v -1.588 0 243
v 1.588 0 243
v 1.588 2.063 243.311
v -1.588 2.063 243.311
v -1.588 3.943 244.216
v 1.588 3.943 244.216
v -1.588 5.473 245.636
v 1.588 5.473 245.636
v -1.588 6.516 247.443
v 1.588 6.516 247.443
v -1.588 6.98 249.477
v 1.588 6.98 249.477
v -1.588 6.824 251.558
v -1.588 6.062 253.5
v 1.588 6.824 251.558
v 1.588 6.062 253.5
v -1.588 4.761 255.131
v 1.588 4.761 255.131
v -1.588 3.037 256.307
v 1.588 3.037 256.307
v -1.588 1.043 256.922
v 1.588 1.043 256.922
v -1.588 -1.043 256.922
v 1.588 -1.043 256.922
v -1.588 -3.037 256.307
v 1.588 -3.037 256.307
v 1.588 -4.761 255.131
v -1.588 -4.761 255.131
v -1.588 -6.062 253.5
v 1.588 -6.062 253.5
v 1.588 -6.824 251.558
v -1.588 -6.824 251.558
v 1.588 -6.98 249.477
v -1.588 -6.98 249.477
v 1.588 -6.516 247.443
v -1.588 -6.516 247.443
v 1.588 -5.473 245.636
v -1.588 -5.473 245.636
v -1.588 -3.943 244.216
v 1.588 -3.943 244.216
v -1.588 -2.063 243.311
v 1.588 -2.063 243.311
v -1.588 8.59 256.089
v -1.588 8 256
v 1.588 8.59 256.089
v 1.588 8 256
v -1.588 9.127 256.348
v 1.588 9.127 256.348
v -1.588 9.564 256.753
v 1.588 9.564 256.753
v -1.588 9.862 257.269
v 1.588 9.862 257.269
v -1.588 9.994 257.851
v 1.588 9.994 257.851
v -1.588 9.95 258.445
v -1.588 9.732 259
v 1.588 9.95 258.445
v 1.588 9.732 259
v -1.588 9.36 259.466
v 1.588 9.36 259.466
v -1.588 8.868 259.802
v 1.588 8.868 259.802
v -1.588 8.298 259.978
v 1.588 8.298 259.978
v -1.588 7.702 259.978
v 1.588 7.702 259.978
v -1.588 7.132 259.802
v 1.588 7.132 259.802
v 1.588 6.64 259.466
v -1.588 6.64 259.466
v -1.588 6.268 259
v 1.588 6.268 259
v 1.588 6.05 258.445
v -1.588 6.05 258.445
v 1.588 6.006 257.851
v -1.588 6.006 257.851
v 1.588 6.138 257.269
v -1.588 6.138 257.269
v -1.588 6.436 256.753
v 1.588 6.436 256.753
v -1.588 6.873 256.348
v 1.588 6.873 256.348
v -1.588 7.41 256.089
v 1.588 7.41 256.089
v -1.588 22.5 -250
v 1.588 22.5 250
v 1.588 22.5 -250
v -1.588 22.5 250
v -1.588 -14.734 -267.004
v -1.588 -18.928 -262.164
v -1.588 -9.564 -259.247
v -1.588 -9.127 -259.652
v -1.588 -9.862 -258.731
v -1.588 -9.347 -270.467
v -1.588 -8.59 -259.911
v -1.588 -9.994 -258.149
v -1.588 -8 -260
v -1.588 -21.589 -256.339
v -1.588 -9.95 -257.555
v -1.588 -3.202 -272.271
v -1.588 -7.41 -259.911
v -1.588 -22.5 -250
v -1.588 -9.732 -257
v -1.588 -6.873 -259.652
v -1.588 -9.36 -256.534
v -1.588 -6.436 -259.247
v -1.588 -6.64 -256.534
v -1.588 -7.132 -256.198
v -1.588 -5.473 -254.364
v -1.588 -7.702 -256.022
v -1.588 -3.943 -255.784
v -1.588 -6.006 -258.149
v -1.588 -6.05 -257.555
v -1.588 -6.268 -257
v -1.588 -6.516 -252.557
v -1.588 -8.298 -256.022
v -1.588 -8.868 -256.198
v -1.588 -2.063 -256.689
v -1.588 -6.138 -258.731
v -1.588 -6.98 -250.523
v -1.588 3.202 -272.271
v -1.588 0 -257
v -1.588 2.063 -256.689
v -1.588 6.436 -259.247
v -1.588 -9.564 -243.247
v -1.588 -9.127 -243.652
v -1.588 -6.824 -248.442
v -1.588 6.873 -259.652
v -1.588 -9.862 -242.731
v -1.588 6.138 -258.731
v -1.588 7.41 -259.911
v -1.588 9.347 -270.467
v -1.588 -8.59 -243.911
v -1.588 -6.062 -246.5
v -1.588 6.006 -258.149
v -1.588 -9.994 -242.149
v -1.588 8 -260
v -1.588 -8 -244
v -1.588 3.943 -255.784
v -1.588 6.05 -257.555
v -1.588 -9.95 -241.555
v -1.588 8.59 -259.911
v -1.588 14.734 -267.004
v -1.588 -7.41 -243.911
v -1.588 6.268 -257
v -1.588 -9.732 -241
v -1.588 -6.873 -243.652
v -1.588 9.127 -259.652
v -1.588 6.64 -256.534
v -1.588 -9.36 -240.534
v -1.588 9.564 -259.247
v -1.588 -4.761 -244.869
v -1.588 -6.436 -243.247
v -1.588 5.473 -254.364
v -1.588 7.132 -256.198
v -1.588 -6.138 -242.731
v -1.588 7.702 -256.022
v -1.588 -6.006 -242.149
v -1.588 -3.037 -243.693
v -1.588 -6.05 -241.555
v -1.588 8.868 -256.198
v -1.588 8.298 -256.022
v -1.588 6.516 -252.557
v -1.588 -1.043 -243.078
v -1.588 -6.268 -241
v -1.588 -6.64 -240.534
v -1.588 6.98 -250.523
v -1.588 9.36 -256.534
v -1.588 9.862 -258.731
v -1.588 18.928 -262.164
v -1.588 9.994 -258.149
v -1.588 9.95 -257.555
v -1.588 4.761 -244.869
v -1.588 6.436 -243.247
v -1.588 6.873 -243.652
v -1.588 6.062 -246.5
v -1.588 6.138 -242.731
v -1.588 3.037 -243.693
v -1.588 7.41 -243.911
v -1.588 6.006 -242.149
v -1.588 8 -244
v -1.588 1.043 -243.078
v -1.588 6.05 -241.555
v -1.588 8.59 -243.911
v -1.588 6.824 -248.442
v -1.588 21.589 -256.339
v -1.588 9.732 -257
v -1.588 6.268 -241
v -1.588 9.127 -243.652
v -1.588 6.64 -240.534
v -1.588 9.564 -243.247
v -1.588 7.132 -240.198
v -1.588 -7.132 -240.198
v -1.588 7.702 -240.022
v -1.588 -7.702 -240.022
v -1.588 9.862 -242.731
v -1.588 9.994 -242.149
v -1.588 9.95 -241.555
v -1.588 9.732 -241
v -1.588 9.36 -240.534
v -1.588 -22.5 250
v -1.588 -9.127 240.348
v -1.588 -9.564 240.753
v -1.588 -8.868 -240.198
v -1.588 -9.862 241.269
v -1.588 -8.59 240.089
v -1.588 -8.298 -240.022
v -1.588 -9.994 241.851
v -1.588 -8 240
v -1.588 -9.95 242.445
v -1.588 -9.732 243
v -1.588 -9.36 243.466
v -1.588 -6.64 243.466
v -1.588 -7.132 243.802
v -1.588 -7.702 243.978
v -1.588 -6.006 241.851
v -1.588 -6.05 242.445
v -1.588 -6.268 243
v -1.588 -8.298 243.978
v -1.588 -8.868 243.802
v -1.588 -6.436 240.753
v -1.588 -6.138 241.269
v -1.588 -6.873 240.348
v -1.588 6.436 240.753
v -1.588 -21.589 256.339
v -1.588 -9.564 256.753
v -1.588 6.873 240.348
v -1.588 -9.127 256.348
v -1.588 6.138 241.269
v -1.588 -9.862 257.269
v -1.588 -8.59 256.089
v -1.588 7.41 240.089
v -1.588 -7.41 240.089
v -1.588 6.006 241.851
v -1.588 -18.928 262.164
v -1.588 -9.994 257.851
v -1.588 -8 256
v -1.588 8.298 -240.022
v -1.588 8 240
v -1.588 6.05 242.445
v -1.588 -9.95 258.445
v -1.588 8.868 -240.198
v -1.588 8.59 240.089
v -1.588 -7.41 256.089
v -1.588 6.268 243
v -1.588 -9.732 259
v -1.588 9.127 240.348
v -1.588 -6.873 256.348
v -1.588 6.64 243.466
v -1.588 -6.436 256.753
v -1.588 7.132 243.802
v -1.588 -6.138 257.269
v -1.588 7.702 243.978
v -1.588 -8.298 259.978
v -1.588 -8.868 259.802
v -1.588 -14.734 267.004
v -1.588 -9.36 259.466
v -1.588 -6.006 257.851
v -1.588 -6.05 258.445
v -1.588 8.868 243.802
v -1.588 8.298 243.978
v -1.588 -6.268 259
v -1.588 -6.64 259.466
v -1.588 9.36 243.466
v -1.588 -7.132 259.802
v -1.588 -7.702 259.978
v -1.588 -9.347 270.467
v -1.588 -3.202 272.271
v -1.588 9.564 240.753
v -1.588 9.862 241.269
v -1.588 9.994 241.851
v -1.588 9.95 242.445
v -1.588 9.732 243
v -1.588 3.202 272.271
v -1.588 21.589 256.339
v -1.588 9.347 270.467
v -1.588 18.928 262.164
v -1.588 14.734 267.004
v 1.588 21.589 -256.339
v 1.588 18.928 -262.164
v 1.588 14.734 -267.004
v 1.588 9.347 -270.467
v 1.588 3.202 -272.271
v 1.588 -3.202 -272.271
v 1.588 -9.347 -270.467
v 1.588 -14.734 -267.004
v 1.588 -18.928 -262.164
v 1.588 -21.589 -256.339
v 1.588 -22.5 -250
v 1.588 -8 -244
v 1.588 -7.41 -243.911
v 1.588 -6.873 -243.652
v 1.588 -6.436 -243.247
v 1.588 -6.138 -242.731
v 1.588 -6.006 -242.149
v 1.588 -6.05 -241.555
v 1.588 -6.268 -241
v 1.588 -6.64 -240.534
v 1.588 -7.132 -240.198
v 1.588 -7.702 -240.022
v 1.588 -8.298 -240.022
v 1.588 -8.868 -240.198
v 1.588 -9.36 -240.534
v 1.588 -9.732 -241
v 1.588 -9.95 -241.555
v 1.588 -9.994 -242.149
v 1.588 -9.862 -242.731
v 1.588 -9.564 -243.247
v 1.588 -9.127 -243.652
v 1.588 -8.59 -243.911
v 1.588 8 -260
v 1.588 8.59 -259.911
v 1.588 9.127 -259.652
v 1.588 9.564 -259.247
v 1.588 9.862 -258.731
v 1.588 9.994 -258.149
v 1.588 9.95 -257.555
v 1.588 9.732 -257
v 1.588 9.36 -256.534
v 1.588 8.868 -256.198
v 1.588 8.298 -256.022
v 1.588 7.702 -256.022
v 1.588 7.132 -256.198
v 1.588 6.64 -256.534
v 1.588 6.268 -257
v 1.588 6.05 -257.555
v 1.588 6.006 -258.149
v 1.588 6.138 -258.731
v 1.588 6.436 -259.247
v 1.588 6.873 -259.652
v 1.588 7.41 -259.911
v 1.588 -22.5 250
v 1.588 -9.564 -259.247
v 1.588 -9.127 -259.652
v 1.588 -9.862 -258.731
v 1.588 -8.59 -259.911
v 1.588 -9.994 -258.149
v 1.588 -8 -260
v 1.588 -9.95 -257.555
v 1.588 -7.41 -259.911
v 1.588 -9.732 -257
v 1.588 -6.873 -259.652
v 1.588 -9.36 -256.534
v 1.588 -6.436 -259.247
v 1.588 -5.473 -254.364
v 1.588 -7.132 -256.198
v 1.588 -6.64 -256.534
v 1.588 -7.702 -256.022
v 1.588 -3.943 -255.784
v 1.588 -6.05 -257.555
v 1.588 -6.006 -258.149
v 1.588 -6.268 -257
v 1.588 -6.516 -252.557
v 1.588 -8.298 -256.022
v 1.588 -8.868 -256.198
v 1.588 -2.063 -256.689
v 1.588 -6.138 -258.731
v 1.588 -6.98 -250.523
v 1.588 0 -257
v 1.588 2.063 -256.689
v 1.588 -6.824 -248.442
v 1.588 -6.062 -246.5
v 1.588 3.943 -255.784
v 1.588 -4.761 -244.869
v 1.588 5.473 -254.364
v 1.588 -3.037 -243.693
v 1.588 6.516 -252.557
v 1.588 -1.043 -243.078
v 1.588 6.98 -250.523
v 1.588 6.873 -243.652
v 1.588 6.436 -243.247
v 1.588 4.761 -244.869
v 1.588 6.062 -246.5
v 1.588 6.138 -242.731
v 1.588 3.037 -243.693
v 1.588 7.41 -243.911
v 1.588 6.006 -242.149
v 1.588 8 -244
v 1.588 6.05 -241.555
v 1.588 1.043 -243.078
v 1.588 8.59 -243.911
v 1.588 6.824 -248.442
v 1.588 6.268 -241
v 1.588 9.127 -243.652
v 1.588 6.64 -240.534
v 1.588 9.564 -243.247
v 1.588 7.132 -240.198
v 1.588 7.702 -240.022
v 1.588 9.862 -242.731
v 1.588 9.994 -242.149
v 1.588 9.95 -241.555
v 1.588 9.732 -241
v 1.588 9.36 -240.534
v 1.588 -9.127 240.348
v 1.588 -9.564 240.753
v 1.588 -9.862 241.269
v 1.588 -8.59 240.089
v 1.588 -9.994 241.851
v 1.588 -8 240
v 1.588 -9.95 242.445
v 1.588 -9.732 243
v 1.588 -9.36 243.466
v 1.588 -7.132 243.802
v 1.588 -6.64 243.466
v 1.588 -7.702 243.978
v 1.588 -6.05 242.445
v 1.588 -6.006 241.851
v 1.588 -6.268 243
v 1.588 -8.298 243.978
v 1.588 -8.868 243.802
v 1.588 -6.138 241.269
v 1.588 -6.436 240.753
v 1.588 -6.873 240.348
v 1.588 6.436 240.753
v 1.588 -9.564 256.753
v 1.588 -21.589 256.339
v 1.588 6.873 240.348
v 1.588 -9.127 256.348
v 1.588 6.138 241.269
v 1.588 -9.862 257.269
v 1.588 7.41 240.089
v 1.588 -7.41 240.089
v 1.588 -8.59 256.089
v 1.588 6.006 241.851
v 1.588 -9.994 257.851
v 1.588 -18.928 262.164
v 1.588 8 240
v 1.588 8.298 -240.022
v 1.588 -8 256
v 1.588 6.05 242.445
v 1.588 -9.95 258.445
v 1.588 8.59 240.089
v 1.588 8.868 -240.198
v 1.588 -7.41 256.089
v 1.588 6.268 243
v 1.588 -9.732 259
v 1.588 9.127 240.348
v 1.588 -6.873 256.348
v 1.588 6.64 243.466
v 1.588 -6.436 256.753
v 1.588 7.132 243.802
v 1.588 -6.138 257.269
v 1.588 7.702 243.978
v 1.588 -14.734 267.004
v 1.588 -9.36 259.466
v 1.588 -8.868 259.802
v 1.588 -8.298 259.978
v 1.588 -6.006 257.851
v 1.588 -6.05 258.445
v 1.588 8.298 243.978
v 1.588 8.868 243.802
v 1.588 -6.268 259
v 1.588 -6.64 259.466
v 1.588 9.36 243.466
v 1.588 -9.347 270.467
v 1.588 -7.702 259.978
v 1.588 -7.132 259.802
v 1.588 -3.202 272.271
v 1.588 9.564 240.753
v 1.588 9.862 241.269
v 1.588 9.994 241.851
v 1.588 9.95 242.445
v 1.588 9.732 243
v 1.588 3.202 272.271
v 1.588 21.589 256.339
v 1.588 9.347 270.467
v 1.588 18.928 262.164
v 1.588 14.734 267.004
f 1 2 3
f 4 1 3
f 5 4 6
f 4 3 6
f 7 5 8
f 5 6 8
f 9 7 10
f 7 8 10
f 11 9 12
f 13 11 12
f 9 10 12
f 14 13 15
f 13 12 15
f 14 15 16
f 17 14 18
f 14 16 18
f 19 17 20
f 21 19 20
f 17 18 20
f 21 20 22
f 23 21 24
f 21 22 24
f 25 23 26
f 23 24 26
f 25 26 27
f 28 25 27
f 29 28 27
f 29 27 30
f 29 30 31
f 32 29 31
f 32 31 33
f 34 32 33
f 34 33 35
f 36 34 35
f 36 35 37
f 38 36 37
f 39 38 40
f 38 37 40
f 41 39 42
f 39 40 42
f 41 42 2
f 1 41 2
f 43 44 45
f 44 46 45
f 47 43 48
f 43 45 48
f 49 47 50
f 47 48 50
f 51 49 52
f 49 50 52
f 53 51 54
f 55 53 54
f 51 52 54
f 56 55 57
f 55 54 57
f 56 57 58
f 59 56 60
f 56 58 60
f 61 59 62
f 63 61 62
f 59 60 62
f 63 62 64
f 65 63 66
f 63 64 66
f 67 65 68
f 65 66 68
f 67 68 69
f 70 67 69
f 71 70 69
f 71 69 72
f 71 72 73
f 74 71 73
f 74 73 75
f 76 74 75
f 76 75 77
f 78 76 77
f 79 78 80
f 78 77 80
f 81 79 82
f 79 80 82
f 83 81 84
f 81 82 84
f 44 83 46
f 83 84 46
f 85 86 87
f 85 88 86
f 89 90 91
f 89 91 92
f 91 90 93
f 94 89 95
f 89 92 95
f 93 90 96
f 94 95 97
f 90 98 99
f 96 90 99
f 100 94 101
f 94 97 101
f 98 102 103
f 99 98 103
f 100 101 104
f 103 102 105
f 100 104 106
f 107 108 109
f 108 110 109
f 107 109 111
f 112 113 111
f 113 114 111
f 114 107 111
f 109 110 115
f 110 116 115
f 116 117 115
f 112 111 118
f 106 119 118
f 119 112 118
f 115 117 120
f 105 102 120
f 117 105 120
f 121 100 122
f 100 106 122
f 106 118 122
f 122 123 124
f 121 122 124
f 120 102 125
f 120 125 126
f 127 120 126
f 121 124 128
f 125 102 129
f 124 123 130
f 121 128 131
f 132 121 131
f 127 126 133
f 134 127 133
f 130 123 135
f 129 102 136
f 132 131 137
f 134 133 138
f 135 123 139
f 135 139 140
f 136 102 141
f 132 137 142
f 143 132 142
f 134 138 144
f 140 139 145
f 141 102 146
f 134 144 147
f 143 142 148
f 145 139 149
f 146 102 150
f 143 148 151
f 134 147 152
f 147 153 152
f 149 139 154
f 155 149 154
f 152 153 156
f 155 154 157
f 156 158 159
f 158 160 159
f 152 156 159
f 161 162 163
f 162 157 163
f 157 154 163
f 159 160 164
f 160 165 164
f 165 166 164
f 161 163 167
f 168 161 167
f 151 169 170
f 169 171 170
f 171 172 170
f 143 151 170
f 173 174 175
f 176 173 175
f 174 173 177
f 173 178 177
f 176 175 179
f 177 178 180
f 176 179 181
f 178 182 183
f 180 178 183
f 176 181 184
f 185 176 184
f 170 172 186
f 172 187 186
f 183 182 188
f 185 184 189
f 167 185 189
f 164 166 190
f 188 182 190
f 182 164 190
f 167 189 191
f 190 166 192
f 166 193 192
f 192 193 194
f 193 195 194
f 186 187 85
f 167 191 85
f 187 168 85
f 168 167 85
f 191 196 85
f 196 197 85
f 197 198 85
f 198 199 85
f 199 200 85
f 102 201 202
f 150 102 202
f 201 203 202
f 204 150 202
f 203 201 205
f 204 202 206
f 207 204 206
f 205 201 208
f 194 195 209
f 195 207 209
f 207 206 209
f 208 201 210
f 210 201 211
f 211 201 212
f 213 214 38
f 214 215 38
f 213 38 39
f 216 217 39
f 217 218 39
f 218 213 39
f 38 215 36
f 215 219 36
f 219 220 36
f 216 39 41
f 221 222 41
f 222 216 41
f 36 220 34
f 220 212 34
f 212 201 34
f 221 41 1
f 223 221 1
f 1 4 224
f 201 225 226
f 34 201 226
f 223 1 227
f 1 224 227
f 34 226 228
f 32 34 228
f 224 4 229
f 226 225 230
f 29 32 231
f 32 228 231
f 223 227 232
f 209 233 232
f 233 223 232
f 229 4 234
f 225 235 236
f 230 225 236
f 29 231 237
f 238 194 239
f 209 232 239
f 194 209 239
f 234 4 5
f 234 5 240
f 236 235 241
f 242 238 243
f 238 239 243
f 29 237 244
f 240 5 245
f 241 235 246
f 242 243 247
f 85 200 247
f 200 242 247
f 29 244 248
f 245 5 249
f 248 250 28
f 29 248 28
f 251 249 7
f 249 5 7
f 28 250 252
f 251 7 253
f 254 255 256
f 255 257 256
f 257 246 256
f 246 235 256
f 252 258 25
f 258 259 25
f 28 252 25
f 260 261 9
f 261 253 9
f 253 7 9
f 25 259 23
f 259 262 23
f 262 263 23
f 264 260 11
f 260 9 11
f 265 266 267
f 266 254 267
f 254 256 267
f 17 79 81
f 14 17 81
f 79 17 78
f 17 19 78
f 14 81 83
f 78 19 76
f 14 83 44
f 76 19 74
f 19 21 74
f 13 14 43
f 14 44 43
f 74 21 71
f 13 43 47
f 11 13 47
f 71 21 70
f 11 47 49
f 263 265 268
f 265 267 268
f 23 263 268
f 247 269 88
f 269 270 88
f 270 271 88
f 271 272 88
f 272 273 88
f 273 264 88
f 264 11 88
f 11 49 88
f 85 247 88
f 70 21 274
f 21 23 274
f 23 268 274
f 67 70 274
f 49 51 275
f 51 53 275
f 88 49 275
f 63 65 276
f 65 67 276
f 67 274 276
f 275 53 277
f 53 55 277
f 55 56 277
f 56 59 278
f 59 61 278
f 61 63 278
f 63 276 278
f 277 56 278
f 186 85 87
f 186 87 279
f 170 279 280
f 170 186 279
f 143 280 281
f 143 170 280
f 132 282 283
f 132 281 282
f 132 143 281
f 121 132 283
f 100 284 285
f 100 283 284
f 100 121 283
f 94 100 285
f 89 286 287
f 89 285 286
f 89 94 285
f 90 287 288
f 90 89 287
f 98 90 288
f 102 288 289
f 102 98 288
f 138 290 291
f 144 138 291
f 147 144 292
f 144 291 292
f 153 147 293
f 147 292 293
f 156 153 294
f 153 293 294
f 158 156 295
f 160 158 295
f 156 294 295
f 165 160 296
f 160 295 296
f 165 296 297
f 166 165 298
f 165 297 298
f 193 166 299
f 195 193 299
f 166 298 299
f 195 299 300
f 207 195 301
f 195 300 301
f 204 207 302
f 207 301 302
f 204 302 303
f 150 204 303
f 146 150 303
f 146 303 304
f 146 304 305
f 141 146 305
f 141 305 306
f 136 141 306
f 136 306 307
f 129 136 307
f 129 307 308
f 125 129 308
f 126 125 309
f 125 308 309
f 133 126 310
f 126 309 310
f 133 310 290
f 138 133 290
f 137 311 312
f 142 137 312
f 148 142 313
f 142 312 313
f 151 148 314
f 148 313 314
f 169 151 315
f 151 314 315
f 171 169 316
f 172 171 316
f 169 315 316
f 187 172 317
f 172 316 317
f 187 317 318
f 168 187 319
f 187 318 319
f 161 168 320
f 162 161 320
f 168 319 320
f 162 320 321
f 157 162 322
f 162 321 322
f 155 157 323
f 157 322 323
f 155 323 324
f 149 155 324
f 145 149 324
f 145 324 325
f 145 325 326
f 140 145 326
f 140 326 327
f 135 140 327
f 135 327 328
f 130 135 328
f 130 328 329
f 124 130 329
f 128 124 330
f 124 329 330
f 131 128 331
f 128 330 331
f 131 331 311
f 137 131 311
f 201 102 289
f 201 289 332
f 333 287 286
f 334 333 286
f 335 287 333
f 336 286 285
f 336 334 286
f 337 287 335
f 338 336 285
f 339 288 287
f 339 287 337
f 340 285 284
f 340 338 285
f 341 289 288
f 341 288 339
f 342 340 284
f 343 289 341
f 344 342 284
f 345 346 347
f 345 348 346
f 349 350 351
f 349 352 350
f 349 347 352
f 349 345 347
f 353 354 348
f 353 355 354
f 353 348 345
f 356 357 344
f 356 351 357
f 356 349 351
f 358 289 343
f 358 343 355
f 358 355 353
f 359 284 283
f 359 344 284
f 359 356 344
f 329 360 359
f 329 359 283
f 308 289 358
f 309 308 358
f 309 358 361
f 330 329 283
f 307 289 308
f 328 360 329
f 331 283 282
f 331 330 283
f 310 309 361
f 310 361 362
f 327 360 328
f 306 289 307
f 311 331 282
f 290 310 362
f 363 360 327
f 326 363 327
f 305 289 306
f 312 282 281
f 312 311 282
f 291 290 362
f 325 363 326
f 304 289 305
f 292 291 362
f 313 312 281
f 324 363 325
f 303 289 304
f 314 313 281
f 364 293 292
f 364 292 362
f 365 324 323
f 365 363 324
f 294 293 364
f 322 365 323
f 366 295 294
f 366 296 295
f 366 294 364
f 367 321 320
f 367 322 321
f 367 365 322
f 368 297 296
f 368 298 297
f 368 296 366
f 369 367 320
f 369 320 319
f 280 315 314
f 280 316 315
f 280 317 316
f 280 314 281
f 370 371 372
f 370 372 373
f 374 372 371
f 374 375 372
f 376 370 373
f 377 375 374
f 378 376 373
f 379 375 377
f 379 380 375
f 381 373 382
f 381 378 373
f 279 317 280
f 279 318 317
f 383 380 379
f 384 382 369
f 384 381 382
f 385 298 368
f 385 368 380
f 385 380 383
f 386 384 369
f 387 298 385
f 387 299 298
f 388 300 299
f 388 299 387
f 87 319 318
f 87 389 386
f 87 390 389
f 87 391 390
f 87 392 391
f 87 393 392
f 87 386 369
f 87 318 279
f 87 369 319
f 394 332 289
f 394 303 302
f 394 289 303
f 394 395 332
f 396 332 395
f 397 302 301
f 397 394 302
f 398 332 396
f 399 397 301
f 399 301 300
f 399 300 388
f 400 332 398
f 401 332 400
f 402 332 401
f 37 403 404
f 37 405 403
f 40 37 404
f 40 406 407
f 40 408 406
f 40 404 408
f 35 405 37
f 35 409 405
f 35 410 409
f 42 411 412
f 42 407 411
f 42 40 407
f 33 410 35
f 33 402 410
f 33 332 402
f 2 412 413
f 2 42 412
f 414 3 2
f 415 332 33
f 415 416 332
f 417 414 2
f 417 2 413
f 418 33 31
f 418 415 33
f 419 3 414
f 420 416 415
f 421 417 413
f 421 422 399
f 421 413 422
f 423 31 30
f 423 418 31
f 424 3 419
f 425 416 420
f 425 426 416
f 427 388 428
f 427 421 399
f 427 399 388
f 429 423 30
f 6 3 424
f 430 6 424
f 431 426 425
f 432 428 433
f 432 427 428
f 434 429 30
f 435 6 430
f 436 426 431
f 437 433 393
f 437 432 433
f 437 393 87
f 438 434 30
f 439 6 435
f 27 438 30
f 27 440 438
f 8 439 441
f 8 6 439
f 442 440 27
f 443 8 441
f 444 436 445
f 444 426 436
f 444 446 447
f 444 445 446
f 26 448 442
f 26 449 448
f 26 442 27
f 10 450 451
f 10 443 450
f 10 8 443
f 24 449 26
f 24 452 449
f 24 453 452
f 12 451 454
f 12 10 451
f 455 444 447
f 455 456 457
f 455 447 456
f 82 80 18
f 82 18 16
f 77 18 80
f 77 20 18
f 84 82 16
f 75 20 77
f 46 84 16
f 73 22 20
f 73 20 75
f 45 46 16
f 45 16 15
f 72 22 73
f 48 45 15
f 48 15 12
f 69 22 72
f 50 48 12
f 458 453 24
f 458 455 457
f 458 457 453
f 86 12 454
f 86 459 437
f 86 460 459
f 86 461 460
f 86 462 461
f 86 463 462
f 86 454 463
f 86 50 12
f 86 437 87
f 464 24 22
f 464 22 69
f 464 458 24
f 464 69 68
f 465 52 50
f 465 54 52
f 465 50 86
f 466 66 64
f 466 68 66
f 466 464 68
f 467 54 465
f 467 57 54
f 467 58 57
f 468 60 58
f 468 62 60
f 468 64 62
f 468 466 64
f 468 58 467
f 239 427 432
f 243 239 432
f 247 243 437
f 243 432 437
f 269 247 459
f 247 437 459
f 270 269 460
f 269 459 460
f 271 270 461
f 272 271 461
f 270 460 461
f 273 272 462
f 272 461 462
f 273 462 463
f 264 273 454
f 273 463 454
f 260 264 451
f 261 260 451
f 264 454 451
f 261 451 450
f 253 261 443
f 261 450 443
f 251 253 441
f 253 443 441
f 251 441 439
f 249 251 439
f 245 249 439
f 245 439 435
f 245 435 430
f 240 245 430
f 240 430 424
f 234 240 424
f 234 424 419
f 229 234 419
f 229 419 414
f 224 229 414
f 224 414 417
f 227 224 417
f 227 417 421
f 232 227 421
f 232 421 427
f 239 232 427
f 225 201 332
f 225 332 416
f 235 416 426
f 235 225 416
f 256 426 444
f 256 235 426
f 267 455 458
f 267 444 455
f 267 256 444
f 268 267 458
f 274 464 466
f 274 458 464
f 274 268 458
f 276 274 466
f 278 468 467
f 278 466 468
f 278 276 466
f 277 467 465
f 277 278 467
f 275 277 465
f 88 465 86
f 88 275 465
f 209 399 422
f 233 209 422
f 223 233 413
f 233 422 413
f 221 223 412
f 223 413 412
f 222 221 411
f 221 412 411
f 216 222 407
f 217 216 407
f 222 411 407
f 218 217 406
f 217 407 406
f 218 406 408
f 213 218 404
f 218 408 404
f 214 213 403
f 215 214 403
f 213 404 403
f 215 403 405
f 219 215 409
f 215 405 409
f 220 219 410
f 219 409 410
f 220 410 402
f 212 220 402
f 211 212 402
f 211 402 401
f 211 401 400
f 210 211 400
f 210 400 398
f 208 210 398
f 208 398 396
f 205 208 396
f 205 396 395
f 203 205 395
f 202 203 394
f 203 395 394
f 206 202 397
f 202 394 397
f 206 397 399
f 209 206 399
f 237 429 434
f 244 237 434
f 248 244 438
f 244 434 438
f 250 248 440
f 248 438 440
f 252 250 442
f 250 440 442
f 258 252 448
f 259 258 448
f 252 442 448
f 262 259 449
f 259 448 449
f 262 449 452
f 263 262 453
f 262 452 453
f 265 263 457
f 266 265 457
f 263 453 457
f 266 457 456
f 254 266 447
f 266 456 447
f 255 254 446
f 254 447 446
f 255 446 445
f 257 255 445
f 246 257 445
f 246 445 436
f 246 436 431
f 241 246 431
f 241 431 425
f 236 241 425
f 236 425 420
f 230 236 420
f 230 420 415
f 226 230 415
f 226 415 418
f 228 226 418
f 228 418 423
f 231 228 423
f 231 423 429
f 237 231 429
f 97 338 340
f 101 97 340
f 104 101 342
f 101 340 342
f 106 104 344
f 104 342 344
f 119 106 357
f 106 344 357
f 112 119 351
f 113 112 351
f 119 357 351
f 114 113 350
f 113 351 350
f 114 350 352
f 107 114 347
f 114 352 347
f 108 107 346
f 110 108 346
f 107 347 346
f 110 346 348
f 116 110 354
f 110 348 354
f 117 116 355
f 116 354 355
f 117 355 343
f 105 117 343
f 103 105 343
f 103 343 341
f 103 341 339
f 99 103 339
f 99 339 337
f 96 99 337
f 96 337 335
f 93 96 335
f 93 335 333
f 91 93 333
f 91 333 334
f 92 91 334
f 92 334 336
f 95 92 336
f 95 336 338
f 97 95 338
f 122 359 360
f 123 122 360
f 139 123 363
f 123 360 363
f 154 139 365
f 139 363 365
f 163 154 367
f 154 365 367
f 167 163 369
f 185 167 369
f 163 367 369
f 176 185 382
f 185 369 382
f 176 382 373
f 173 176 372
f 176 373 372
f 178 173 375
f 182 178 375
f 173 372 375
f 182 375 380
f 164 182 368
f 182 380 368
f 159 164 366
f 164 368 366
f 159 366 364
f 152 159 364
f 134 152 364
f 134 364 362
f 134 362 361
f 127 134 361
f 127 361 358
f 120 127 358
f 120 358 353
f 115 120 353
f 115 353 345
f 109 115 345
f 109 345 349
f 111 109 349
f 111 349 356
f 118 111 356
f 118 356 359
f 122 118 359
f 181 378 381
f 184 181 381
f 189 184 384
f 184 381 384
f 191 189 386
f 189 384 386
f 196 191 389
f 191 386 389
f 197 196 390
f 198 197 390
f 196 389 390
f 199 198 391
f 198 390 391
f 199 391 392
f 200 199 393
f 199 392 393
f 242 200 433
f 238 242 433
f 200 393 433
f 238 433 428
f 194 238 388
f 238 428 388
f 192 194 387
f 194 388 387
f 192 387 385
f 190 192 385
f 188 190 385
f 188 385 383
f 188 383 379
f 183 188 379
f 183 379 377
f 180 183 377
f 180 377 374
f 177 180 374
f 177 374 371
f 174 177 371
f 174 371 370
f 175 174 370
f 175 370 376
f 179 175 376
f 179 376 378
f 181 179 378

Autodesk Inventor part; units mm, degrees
ref_plane "YZ Plane" through (0, 0, 0) normal (1, 0, 0) x (0, 1, 0)
ref_plane "XZ Plane" through (0, 0, 0) normal (0, 1, 0) x (-1, 0, 0)
ref_plane "XY Plane" through (0, 0, 0) normal (0, 0, 1) x (1, 0, 0)
sketch "Sketch1" plane through (0, 0, 0) normal (1, 0, 0) x (0, 1, 0)
  line L0 (-22.5, 250) -> (22.5, 250) construction
  line L1 (22.5, 250) -> (22.5, -250)
  line L2 (22.5, -250) -> (-22.5, -250) construction
  line L3 (-22.5, -250) -> (-22.5, 250)
  line L4 (-22.5, 250) -> (22.5, -250) construction
  line L5 (22.5, 250) -> (-22.5, -250) construction
  arc A0 (-22.5, -250) -> (22.5, -250) centre (0, -250) ccw
  arc A1 (22.5, 250) -> (-22.5, 250) centre (0, 250) ccw
  point P0 (0, 0)
  dimension "d0" = 45
  dimension "d1" = 500
extrude "Extrusion2" add sketch "Sketch1" along normal mid plane 3.175
sketch "Sketch3" plane through (1.5875, 0, 0) normal (1, 0, 0) x (0, 0, -1)
  line L0 (250, 22.5) -> (-250, 22.5) construction
  arc A0 (-250, 22.5) -> (-250, -22.5) centre (-250, 0) ccw construction
  line L1 (-250, -22.5) -> (250, -22.5) construction
  arc A1 (250, -22.5) -> (250, 22.5) centre (250, 0) ccw construction
  circle A2 centre (-250, 0) radius 7
  circle A3 centre (-258, 8) radius 2
  circle A4 centre (-258, -8) radius 2
  circle A5 centre (-242, -8) radius 2
  circle A6 centre (-242, 8) radius 2
  line L2 (0, 22.5) -> (0, -22.5) construction
  circle A7 centre (250, 0) radius 7
  circle A8 centre (258, 8) radius 2
  circle A9 centre (258, -8) radius 2
  circle A10 centre (242, -8) radius 2
  circle A11 centre (242, 8) radius 2
  point P0 (0, 0)
  dimension "d14" = 14
  dimension "d15" = 4
  dimension "d16" = 8
  dimension "d17" = 8
  dimension "d20" = 360
extrude "Extrusion3" cut sketch "Sketch3" against normal through all
properties part number "ArmBarStage1"
